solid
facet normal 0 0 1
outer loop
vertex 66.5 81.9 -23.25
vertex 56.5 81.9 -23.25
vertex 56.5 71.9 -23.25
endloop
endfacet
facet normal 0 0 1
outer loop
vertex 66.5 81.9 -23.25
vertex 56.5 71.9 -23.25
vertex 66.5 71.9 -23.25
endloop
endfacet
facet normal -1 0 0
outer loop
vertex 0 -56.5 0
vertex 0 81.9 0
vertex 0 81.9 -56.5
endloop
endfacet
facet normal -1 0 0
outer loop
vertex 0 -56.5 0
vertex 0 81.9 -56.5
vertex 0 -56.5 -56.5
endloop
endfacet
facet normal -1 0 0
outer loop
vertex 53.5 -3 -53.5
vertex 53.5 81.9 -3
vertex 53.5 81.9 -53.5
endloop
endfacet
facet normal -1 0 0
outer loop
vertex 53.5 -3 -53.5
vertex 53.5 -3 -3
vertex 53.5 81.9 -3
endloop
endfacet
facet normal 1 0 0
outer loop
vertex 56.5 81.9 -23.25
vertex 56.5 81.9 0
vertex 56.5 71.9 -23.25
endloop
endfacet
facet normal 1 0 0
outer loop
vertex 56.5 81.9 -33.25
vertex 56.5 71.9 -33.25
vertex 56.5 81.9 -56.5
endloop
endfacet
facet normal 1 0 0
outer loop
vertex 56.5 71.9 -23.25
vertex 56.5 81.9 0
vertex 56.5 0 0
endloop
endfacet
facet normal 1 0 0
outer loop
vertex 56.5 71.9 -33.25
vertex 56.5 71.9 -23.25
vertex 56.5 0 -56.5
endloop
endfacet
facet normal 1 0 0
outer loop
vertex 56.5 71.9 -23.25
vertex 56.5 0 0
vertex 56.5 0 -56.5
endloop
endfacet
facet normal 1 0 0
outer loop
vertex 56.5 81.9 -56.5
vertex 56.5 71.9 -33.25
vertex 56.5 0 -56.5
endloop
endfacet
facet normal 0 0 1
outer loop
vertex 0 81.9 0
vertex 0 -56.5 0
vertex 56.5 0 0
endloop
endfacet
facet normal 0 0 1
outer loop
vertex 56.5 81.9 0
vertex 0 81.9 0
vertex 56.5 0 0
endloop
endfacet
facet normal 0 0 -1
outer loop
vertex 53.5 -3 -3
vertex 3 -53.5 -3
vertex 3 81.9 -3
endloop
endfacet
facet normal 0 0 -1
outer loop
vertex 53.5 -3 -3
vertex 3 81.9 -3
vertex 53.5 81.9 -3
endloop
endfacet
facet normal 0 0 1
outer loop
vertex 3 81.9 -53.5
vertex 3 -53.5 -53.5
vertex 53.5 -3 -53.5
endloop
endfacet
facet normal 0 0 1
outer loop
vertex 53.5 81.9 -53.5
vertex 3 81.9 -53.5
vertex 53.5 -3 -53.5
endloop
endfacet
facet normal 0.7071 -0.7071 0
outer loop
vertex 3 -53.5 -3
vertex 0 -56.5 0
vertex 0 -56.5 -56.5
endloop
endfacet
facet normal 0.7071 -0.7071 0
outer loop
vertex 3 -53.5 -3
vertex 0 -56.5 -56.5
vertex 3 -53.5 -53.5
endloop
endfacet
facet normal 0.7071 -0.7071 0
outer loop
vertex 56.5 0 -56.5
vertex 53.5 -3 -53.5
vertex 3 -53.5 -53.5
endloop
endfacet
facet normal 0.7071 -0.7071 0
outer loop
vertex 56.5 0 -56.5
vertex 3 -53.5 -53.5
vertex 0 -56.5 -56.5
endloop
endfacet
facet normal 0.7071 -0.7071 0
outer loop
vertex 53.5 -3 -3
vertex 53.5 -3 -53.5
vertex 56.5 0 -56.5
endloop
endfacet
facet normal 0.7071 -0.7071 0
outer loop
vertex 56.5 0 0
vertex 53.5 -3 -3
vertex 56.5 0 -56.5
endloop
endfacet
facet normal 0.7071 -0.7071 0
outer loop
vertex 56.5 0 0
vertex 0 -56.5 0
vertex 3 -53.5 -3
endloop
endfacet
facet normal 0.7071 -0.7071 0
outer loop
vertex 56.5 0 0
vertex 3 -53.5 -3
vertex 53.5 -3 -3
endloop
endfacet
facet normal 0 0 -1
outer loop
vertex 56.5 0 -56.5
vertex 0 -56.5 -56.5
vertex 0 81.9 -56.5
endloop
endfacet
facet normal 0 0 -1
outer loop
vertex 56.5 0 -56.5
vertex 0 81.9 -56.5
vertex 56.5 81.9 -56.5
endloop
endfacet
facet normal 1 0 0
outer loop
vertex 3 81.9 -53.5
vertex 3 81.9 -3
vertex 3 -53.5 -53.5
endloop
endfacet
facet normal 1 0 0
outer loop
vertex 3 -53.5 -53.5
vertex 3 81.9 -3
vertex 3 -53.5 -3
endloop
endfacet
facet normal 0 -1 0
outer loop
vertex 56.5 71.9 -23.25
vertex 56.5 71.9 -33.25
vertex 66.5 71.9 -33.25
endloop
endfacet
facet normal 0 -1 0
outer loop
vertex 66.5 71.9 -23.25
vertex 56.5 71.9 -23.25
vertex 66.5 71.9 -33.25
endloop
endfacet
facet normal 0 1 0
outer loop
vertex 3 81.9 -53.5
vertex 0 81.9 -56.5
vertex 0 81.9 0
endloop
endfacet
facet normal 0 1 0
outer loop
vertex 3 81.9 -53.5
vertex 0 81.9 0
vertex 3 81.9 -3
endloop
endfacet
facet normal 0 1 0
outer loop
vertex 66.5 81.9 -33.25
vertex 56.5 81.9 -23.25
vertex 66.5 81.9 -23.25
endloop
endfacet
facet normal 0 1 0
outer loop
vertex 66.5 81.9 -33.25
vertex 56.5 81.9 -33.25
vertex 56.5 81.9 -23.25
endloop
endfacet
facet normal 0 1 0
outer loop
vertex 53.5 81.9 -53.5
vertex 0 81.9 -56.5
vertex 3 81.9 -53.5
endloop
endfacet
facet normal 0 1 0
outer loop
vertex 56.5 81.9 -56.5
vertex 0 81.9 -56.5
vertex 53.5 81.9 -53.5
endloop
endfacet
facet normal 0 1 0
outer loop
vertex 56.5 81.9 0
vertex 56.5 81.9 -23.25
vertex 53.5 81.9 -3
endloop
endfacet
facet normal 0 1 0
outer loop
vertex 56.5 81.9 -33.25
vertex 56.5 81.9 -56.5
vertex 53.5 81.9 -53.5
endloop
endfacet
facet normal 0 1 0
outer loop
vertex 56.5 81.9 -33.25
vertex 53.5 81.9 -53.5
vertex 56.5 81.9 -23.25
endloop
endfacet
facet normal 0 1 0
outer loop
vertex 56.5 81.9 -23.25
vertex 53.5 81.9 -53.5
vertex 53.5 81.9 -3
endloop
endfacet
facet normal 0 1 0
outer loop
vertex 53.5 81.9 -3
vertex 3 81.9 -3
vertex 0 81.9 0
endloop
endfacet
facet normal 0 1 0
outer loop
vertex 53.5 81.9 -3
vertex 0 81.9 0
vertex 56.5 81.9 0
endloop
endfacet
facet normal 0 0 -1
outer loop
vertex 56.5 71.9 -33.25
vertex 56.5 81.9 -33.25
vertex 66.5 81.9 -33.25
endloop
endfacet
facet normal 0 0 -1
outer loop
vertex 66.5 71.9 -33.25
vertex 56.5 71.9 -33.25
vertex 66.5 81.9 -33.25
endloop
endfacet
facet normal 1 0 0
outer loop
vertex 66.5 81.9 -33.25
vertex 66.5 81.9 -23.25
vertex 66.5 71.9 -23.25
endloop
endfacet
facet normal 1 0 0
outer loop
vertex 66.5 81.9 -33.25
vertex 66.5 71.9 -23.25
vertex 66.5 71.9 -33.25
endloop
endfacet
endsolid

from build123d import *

# Parameters (mm, degrees)
CROQUIS1_W              = 56.5
CROQUIS1_H              = 56.5
SALIENTE_EXTRUIR1_DEPTH = 81.9
SALIENTE_EXTRUIR2_DEPTH = 56.5
VACIADO4_T              = -3
CROQUIS3_W              = 10
CROQUIS3_H              = 10
SALIENTE_EXTRUIR3_DEPTH = 10


with BuildPart() as part:
    # Croquis1 → Saliente-Extruir1 (new body)
    with BuildSketch(Plane(origin=(0, 0, 0), x_dir=(1, 0, 0), z_dir=(0, 1, 0))):
        with Locations((28.25, 28.25)):
            Rectangle(CROQUIS1_W, CROQUIS1_H)
    extrude(amount=SALIENTE_EXTRUIR1_DEPTH)

    # Croquis2 → Saliente-Extruir2 (add)
    with BuildSketch(Plane.XY):
        Polygon((0, 0), (0, -56.5), (56.5, 0), align=None)
    extrude(amount=-SALIENTE_EXTRUIR2_DEPTH)

    # Vaciado4
    vaciado4_openings = [part.faces().sort_by_distance(p)[0] for p in [
        (28.25, 81.9, -28.25),
        (28.25, -28.25, -28.25),
    ]]
    offset(amount=VACIADO4_T, openings=vaciado4_openings, kind=Kind.INTERSECTION)

    # Croquis3 → Saliente-Extruir3 (add)
    with BuildSketch(Plane(origin=(0, 81.9, 0), x_dir=(1, 0, 0), z_dir=(0, 1, 0))):
        with Locations((61.5, 28.25)):
            Rectangle(CROQUIS3_W, CROQUIS3_H)
    extrude(amount=-SALIENTE_EXTRUIR3_DEPTH)


solid = part.part
